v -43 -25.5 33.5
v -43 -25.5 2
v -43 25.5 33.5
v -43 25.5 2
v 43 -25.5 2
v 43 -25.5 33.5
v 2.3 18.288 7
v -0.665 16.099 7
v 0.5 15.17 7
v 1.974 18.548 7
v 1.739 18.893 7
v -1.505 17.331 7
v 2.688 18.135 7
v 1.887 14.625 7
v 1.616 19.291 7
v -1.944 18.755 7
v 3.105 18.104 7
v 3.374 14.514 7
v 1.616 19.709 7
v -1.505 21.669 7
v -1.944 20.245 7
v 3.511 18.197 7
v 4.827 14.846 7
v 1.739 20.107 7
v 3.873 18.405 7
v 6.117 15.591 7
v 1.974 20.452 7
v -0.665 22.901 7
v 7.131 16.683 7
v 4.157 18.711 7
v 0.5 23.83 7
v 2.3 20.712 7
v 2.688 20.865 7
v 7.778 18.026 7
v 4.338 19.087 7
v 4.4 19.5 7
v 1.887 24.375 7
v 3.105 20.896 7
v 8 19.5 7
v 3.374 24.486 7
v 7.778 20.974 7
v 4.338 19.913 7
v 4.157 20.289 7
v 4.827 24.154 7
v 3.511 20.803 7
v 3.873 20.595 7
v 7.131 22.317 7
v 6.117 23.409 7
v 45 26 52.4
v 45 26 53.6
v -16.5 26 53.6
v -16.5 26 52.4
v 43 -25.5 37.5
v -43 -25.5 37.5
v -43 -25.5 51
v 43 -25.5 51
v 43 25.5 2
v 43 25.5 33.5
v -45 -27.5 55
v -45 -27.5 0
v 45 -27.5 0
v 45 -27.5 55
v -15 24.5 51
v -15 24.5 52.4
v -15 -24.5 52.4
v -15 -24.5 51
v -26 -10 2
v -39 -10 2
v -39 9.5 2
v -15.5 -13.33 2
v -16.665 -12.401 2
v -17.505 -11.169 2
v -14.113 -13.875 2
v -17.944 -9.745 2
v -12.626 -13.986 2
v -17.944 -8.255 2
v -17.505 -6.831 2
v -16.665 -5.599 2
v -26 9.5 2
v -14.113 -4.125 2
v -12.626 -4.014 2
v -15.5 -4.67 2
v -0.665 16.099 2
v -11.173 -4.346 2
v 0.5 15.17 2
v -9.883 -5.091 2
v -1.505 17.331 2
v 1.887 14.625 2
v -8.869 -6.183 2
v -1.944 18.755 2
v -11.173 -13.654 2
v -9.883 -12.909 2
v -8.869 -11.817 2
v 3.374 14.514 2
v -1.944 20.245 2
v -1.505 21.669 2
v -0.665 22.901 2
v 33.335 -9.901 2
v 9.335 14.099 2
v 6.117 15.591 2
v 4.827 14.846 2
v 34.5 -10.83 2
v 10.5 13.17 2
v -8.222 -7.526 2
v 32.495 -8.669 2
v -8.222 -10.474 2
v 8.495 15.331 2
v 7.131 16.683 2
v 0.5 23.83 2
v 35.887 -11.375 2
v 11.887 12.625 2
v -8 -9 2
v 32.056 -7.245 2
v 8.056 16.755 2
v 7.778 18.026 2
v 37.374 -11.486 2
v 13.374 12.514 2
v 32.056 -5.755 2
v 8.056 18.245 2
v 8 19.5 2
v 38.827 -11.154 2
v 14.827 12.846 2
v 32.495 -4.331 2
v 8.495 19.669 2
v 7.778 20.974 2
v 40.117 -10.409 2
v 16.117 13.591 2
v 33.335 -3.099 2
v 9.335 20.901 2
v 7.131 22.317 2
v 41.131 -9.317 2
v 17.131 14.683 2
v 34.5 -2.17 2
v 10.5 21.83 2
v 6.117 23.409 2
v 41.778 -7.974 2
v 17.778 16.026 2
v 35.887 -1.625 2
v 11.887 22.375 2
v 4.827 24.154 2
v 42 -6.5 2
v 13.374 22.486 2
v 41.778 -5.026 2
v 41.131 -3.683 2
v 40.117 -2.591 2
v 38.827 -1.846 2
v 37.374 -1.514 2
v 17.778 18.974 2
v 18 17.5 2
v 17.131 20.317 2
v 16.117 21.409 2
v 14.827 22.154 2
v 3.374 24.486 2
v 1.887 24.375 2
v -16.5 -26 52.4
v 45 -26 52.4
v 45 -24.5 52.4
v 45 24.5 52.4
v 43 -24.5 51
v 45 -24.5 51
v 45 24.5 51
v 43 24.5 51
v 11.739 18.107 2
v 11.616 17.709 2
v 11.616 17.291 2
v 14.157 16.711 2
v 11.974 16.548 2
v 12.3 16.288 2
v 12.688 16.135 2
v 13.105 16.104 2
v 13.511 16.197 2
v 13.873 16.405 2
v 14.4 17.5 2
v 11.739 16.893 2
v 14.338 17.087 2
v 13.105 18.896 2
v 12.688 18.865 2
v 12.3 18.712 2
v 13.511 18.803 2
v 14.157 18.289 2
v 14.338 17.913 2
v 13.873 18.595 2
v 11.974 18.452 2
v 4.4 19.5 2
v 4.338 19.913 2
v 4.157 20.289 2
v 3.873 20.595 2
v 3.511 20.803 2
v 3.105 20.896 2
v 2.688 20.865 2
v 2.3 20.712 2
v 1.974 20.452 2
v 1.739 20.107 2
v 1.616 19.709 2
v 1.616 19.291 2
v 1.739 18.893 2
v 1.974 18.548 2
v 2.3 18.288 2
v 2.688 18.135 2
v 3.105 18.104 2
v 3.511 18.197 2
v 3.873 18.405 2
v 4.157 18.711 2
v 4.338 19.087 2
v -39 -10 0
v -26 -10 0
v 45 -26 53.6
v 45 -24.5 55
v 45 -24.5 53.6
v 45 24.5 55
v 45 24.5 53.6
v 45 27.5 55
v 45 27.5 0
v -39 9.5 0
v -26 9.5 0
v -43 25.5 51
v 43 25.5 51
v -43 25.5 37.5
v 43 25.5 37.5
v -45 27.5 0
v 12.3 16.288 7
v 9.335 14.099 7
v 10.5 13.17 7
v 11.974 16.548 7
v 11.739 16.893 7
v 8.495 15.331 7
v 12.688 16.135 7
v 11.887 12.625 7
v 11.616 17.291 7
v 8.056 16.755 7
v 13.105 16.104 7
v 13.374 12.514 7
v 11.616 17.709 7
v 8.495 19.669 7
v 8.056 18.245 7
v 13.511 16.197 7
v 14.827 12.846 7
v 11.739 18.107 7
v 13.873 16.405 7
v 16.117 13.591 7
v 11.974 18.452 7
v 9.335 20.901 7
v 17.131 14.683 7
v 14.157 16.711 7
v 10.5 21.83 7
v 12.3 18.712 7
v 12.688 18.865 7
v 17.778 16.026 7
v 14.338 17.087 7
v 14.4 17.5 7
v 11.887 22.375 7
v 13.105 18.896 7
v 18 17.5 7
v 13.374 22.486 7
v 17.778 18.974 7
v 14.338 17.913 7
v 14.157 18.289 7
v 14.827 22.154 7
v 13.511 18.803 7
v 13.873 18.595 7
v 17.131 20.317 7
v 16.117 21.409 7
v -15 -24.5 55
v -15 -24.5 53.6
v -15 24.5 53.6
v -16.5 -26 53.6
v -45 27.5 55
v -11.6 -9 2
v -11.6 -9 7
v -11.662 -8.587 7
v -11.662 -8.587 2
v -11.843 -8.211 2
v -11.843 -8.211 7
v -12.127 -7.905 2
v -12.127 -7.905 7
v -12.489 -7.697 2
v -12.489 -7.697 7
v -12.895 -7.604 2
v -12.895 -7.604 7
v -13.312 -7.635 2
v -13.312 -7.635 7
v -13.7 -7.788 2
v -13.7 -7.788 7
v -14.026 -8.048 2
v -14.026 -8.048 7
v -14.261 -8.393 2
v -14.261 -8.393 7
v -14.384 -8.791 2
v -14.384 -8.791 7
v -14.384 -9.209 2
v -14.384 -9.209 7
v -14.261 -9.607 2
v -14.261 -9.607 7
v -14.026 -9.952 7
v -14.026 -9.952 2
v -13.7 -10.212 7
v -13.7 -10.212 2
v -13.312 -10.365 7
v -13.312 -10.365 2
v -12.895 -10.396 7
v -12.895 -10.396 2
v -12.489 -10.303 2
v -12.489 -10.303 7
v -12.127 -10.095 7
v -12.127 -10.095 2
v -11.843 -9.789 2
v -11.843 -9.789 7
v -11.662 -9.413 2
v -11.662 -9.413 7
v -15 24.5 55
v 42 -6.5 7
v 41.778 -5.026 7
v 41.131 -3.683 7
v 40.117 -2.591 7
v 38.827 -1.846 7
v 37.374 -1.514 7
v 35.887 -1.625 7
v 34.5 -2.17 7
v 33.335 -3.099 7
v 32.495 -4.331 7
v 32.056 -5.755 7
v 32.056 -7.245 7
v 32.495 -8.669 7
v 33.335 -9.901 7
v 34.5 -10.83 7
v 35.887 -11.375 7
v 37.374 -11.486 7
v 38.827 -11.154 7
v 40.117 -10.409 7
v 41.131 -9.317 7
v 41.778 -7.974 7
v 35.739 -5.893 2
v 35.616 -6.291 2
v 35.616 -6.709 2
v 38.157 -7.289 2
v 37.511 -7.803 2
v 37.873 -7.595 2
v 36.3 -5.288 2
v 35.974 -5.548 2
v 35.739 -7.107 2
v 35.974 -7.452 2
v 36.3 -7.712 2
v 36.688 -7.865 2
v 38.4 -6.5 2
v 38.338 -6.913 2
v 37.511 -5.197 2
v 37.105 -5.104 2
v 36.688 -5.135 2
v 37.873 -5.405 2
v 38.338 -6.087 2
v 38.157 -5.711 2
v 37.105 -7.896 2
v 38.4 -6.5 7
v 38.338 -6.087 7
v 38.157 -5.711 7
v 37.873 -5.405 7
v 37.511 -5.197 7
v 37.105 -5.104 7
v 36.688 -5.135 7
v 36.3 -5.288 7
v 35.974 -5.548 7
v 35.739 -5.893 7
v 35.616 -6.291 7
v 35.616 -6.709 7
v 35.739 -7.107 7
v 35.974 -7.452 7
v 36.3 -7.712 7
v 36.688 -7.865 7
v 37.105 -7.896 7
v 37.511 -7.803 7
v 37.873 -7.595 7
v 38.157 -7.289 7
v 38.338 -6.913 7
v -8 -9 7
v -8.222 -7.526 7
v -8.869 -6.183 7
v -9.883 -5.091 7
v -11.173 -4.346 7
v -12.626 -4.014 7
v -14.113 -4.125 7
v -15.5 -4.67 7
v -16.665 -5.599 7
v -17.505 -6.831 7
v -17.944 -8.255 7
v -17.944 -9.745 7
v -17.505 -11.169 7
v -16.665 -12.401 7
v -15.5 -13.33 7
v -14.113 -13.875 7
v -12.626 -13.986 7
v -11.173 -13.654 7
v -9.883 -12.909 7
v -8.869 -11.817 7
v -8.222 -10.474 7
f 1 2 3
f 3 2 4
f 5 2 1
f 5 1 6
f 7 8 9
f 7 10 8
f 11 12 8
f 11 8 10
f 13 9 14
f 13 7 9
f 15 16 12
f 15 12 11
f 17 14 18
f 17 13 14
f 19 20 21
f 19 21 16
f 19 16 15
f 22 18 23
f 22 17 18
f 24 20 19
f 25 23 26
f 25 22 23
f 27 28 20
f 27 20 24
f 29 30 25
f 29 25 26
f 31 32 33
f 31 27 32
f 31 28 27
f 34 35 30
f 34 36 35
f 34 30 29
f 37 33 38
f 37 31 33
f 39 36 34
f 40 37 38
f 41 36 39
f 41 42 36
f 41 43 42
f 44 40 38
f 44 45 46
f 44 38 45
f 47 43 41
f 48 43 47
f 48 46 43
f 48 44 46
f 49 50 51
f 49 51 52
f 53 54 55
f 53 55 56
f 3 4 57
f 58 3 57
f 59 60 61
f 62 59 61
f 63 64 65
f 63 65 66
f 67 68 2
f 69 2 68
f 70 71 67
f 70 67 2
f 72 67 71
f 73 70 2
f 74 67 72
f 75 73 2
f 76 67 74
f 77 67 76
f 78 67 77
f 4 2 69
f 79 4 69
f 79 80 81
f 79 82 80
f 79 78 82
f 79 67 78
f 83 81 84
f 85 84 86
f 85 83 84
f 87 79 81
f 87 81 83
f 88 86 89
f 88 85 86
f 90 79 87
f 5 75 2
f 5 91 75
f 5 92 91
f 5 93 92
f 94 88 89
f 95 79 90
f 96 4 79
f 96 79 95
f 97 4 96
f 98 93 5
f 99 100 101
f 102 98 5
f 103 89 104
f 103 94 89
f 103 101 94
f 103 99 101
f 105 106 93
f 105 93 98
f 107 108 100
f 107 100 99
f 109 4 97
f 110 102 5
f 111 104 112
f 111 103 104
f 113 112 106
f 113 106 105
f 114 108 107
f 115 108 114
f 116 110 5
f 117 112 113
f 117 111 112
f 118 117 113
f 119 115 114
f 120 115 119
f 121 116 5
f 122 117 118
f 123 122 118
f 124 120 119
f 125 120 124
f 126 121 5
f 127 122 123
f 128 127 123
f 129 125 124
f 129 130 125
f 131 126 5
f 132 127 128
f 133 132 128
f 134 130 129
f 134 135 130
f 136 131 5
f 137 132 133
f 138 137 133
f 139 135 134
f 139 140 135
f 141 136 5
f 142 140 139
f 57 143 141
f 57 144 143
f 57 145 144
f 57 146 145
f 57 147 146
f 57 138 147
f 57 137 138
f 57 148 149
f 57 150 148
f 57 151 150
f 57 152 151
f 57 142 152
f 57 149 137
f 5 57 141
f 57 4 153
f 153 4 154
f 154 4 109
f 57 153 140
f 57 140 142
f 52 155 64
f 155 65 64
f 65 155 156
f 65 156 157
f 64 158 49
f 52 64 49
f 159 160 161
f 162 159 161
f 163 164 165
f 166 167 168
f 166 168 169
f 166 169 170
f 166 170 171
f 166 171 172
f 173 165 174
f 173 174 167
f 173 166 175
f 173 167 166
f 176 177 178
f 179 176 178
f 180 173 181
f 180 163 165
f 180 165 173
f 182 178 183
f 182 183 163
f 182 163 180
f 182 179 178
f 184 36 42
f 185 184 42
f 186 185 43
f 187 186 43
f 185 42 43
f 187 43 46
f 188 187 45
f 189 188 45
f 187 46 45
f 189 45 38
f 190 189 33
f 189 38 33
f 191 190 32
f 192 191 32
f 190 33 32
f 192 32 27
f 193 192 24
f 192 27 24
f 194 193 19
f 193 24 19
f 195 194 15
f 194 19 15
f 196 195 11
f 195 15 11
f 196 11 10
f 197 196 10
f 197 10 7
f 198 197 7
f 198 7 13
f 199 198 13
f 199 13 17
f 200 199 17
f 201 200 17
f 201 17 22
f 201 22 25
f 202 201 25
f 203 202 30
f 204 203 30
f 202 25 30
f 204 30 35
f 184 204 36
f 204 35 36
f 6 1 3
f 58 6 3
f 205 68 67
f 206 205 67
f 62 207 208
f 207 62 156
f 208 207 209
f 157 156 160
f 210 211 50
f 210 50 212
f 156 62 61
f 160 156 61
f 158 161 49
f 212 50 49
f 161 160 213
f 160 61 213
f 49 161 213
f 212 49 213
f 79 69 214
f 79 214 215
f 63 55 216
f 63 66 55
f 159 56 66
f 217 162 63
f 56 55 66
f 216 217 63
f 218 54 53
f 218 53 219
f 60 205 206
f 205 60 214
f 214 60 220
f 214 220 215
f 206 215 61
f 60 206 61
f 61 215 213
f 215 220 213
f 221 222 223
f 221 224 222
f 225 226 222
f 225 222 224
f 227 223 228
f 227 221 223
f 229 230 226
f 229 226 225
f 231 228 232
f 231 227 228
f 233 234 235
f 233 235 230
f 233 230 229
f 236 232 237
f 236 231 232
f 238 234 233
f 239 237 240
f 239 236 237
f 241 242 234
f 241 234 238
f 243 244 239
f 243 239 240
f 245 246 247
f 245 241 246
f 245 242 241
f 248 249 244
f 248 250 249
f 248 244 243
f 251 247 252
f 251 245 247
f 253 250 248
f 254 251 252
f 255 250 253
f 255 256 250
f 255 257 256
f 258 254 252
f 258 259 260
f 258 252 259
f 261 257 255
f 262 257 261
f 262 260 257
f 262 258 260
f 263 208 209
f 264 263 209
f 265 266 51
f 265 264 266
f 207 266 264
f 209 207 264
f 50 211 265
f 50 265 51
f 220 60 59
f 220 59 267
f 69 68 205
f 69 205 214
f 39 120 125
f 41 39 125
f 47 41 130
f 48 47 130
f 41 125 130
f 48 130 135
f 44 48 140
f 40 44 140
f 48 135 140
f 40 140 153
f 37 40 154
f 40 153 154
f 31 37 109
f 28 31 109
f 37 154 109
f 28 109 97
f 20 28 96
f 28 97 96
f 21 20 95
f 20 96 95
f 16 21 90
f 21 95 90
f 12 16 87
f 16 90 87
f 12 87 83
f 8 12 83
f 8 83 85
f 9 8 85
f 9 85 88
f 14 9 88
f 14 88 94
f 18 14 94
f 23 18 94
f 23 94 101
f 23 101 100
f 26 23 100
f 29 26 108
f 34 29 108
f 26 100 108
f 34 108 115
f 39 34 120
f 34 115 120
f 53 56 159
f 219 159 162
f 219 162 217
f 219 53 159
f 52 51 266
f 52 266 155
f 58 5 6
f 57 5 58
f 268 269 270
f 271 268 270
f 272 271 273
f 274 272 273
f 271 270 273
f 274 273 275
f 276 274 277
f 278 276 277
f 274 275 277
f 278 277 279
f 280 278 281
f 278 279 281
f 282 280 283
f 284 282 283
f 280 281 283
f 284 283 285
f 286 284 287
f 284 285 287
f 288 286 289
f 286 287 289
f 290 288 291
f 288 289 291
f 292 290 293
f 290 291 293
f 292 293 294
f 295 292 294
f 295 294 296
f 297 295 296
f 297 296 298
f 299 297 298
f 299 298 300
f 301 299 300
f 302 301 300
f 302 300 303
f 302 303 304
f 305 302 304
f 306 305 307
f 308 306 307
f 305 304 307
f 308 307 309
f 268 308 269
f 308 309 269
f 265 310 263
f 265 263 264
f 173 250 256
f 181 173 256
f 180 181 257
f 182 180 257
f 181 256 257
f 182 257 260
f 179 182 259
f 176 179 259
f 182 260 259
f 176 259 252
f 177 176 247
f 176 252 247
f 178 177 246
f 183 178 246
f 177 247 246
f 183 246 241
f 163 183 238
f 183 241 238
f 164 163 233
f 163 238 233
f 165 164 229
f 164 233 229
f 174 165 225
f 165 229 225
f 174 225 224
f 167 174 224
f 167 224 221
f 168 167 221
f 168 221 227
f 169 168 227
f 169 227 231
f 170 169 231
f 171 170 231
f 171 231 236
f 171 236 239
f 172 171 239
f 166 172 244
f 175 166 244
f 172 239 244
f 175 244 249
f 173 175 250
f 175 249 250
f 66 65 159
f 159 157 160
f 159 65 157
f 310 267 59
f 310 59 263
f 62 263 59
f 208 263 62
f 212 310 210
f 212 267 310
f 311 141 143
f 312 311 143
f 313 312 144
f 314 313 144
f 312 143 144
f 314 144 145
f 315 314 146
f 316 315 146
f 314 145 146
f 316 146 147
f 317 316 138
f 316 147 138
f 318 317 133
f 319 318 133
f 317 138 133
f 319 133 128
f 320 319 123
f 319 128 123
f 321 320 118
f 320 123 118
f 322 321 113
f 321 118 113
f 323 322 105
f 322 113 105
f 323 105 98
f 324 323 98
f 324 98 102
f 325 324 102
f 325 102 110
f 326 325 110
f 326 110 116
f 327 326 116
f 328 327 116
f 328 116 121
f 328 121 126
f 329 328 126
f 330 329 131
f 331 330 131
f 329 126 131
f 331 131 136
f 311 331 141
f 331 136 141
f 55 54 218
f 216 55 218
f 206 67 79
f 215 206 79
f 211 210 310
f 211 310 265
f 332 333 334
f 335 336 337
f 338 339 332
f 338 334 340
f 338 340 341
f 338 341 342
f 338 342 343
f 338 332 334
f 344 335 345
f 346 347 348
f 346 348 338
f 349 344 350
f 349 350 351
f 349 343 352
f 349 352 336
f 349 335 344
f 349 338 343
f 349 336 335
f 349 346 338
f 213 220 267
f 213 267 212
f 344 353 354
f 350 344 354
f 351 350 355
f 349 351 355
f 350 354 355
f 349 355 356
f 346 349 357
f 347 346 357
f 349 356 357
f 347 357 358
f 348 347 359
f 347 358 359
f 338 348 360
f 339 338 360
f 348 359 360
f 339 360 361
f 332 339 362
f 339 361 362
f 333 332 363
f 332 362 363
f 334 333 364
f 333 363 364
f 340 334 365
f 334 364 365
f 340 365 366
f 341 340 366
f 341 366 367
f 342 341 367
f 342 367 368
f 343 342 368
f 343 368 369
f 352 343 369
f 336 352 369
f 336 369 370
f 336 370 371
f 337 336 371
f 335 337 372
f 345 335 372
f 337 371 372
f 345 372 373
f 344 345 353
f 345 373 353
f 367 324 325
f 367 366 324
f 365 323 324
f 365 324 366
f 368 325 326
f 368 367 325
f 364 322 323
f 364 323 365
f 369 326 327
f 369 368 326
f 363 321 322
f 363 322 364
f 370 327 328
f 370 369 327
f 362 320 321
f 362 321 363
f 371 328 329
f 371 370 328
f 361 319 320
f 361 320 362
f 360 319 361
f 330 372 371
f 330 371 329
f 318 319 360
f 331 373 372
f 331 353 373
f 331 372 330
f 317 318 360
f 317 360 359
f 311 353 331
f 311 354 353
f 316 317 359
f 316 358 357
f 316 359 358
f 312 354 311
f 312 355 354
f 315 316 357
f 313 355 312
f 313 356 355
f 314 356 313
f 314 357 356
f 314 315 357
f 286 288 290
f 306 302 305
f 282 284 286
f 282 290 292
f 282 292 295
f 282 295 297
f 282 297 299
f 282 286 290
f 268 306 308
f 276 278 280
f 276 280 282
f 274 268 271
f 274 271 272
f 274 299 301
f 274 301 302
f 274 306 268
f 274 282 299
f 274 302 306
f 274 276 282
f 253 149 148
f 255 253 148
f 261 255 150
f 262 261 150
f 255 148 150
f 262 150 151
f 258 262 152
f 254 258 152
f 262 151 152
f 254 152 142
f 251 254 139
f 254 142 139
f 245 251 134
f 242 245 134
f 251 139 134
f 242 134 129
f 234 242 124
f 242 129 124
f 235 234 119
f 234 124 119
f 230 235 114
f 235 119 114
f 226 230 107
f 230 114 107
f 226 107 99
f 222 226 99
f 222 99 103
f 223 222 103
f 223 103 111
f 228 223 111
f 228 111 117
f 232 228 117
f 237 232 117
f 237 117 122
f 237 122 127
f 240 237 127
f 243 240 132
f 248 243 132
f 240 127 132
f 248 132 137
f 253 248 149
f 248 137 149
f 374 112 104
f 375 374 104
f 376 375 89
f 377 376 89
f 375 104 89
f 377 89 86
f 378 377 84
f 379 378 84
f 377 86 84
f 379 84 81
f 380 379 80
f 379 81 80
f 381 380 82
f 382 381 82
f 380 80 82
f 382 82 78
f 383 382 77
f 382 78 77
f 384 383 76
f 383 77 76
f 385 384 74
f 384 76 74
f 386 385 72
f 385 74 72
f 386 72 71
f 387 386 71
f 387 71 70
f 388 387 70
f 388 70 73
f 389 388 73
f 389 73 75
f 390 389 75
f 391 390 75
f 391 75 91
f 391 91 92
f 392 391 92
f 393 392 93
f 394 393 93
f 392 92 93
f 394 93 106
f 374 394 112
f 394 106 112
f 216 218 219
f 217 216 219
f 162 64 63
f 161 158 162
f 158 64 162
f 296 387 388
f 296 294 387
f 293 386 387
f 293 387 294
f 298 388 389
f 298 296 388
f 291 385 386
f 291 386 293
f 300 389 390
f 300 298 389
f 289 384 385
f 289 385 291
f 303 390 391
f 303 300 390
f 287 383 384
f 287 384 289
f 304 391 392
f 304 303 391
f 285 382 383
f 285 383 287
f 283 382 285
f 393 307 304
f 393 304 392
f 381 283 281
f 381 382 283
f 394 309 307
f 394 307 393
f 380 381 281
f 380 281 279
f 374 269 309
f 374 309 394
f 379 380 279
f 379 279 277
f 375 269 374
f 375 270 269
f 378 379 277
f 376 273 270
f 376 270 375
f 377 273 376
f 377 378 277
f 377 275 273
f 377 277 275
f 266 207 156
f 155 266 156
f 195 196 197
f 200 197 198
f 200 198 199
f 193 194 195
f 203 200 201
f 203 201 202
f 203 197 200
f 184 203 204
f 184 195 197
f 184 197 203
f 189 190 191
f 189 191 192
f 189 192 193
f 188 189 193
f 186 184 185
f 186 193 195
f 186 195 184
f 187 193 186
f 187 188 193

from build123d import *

# Parameters (mm, degrees)
SKETCH1_W           = 90
SKETCH1_H           = 55
BOSS_EXTRUDE1_DEPTH = 55
SHELL1_T            = -2
SKETCH2_W           = 4
SKETCH2_H           = 55
BOSS_EXTRUDE2_DEPTH = 88
SKETCH3_W           = 4
SKETCH3_H           = 49
CUT_EXTRUDE1_DEPTH  = 60
SKETCH4_W           = 1.2
SKETCH4_H           = 52
CUT_EXTRUDE2_DEPTH  = 61.5
CUT_EXTRUDE3_START  = -10
SKETCH5_W           = 13
SKETCH5_H           = 19.5
CUT_EXTRUDE3_DEPTH  = 46
SKETCH7_R           = 5
BOSS_EXTRUDE3_DEPTH = 5
SKETCH8_R           = 1.4
CUT_EXTRUDE4_DEPTH  = 5
BOSS_EXTRUDE4_REACH = 90
SKETCH9_W           = 4
SKETCH9_H           = 51


with BuildPart() as part:
    # Sketch1 → Boss-Extrude1 (new body)
    with BuildSketch(Plane.XY):
        Rectangle(SKETCH1_W, SKETCH1_H)
    extrude(amount=BOSS_EXTRUDE1_DEPTH)

    # Shell1
    shell1_openings = [part.faces().sort_by_distance(p)[0] for p in [
        (0, 0, 55),
    ]]
    offset(amount=SHELL1_T, openings=shell1_openings, kind=Kind.INTERSECTION)

    # Sketch2 → Boss-Extrude2 (add)
    with BuildSketch(Plane(origin=(45, 0, 0), x_dir=(0, 0, -1), z_dir=(1, 0, 0))):
        with Locations((-53, 0)):
            Rectangle(SKETCH2_W, SKETCH2_H)
    extrude(amount=-BOSS_EXTRUDE2_DEPTH)

    # Sketch3 → Cut-Extrude1 (cut)
    with BuildSketch(Plane(origin=(45, 0, 0), x_dir=(0, 0, -1), z_dir=(1, 0, 0))):
        with Locations((-53, 0)):
            Rectangle(SKETCH3_W, SKETCH3_H)
    extrude(amount=-CUT_EXTRUDE1_DEPTH, mode=Mode.SUBTRACT)

    # Sketch4 → Cut-Extrude2 (cut)
    with BuildSketch(Plane(origin=(45, 0, 0), x_dir=(0, 0, -1), z_dir=(1, 0, 0))):
        with Locations((-53, 0)):
            Rectangle(SKETCH4_W, SKETCH4_H)
    extrude(amount=-CUT_EXTRUDE2_DEPTH, mode=Mode.SUBTRACT)

    # Sketch5 → Cut-Extrude3 (cut, through all)
    with BuildSketch(Plane.XY.offset(55).offset(CUT_EXTRUDE3_START)):
        with Locations((-32.5, -0.25)):
            Rectangle(SKETCH5_W, SKETCH5_H)
    extrude(amount=-CUT_EXTRUDE3_DEPTH, mode=Mode.SUBTRACT)

    # Sketch7 → Boss-Extrude3 (add)
    with BuildSketch(Plane.XY.offset(2)):
        with Locations((3, 19.5)):
            Circle(SKETCH7_R)
        with Locations((-13, -9)):
            Circle(SKETCH7_R)
        with Locations((13, 17.5)):
            Circle(SKETCH7_R)
        with Locations((37, -6.5)):
            Circle(SKETCH7_R)
    extrude(amount=BOSS_EXTRUDE3_DEPTH)

    # Sketch8 → Cut-Extrude4 (cut)
    with BuildSketch(Plane.XY.offset(7)):
        with Locations((13, 17.5)):
            Circle(SKETCH8_R)
        with Locations((-13, -9)):
            Circle(SKETCH8_R)
        with Locations((37, -6.5)):
            Circle(SKETCH8_R)
        with Locations((3, 19.5)):
            Circle(SKETCH8_R)
    extrude(amount=-CUT_EXTRUDE4_DEPTH, mode=Mode.SUBTRACT)

    # Sketch9 → Boss-Extrude4 (add, up to next)
    with BuildSketch(Plane(origin=(-43, 0, 0), x_dir=(0, 0, -1), z_dir=(1, 0, 0)), mode=Mode.PRIVATE) as boss_extrude4_sk1:
        with Locations((-35.5, 0)):
            Rectangle(SKETCH9_W, SKETCH9_H)
    boss_extrude4_tool1 = extrude(boss_extrude4_sk1.sketch, amount=BOSS_EXTRUDE4_REACH, mode=Mode.PRIVATE) - part.part
    add(boss_extrude4_tool1.solids().sort_by_distance((-43, 0, 35.5))[0])


solid = part.part
